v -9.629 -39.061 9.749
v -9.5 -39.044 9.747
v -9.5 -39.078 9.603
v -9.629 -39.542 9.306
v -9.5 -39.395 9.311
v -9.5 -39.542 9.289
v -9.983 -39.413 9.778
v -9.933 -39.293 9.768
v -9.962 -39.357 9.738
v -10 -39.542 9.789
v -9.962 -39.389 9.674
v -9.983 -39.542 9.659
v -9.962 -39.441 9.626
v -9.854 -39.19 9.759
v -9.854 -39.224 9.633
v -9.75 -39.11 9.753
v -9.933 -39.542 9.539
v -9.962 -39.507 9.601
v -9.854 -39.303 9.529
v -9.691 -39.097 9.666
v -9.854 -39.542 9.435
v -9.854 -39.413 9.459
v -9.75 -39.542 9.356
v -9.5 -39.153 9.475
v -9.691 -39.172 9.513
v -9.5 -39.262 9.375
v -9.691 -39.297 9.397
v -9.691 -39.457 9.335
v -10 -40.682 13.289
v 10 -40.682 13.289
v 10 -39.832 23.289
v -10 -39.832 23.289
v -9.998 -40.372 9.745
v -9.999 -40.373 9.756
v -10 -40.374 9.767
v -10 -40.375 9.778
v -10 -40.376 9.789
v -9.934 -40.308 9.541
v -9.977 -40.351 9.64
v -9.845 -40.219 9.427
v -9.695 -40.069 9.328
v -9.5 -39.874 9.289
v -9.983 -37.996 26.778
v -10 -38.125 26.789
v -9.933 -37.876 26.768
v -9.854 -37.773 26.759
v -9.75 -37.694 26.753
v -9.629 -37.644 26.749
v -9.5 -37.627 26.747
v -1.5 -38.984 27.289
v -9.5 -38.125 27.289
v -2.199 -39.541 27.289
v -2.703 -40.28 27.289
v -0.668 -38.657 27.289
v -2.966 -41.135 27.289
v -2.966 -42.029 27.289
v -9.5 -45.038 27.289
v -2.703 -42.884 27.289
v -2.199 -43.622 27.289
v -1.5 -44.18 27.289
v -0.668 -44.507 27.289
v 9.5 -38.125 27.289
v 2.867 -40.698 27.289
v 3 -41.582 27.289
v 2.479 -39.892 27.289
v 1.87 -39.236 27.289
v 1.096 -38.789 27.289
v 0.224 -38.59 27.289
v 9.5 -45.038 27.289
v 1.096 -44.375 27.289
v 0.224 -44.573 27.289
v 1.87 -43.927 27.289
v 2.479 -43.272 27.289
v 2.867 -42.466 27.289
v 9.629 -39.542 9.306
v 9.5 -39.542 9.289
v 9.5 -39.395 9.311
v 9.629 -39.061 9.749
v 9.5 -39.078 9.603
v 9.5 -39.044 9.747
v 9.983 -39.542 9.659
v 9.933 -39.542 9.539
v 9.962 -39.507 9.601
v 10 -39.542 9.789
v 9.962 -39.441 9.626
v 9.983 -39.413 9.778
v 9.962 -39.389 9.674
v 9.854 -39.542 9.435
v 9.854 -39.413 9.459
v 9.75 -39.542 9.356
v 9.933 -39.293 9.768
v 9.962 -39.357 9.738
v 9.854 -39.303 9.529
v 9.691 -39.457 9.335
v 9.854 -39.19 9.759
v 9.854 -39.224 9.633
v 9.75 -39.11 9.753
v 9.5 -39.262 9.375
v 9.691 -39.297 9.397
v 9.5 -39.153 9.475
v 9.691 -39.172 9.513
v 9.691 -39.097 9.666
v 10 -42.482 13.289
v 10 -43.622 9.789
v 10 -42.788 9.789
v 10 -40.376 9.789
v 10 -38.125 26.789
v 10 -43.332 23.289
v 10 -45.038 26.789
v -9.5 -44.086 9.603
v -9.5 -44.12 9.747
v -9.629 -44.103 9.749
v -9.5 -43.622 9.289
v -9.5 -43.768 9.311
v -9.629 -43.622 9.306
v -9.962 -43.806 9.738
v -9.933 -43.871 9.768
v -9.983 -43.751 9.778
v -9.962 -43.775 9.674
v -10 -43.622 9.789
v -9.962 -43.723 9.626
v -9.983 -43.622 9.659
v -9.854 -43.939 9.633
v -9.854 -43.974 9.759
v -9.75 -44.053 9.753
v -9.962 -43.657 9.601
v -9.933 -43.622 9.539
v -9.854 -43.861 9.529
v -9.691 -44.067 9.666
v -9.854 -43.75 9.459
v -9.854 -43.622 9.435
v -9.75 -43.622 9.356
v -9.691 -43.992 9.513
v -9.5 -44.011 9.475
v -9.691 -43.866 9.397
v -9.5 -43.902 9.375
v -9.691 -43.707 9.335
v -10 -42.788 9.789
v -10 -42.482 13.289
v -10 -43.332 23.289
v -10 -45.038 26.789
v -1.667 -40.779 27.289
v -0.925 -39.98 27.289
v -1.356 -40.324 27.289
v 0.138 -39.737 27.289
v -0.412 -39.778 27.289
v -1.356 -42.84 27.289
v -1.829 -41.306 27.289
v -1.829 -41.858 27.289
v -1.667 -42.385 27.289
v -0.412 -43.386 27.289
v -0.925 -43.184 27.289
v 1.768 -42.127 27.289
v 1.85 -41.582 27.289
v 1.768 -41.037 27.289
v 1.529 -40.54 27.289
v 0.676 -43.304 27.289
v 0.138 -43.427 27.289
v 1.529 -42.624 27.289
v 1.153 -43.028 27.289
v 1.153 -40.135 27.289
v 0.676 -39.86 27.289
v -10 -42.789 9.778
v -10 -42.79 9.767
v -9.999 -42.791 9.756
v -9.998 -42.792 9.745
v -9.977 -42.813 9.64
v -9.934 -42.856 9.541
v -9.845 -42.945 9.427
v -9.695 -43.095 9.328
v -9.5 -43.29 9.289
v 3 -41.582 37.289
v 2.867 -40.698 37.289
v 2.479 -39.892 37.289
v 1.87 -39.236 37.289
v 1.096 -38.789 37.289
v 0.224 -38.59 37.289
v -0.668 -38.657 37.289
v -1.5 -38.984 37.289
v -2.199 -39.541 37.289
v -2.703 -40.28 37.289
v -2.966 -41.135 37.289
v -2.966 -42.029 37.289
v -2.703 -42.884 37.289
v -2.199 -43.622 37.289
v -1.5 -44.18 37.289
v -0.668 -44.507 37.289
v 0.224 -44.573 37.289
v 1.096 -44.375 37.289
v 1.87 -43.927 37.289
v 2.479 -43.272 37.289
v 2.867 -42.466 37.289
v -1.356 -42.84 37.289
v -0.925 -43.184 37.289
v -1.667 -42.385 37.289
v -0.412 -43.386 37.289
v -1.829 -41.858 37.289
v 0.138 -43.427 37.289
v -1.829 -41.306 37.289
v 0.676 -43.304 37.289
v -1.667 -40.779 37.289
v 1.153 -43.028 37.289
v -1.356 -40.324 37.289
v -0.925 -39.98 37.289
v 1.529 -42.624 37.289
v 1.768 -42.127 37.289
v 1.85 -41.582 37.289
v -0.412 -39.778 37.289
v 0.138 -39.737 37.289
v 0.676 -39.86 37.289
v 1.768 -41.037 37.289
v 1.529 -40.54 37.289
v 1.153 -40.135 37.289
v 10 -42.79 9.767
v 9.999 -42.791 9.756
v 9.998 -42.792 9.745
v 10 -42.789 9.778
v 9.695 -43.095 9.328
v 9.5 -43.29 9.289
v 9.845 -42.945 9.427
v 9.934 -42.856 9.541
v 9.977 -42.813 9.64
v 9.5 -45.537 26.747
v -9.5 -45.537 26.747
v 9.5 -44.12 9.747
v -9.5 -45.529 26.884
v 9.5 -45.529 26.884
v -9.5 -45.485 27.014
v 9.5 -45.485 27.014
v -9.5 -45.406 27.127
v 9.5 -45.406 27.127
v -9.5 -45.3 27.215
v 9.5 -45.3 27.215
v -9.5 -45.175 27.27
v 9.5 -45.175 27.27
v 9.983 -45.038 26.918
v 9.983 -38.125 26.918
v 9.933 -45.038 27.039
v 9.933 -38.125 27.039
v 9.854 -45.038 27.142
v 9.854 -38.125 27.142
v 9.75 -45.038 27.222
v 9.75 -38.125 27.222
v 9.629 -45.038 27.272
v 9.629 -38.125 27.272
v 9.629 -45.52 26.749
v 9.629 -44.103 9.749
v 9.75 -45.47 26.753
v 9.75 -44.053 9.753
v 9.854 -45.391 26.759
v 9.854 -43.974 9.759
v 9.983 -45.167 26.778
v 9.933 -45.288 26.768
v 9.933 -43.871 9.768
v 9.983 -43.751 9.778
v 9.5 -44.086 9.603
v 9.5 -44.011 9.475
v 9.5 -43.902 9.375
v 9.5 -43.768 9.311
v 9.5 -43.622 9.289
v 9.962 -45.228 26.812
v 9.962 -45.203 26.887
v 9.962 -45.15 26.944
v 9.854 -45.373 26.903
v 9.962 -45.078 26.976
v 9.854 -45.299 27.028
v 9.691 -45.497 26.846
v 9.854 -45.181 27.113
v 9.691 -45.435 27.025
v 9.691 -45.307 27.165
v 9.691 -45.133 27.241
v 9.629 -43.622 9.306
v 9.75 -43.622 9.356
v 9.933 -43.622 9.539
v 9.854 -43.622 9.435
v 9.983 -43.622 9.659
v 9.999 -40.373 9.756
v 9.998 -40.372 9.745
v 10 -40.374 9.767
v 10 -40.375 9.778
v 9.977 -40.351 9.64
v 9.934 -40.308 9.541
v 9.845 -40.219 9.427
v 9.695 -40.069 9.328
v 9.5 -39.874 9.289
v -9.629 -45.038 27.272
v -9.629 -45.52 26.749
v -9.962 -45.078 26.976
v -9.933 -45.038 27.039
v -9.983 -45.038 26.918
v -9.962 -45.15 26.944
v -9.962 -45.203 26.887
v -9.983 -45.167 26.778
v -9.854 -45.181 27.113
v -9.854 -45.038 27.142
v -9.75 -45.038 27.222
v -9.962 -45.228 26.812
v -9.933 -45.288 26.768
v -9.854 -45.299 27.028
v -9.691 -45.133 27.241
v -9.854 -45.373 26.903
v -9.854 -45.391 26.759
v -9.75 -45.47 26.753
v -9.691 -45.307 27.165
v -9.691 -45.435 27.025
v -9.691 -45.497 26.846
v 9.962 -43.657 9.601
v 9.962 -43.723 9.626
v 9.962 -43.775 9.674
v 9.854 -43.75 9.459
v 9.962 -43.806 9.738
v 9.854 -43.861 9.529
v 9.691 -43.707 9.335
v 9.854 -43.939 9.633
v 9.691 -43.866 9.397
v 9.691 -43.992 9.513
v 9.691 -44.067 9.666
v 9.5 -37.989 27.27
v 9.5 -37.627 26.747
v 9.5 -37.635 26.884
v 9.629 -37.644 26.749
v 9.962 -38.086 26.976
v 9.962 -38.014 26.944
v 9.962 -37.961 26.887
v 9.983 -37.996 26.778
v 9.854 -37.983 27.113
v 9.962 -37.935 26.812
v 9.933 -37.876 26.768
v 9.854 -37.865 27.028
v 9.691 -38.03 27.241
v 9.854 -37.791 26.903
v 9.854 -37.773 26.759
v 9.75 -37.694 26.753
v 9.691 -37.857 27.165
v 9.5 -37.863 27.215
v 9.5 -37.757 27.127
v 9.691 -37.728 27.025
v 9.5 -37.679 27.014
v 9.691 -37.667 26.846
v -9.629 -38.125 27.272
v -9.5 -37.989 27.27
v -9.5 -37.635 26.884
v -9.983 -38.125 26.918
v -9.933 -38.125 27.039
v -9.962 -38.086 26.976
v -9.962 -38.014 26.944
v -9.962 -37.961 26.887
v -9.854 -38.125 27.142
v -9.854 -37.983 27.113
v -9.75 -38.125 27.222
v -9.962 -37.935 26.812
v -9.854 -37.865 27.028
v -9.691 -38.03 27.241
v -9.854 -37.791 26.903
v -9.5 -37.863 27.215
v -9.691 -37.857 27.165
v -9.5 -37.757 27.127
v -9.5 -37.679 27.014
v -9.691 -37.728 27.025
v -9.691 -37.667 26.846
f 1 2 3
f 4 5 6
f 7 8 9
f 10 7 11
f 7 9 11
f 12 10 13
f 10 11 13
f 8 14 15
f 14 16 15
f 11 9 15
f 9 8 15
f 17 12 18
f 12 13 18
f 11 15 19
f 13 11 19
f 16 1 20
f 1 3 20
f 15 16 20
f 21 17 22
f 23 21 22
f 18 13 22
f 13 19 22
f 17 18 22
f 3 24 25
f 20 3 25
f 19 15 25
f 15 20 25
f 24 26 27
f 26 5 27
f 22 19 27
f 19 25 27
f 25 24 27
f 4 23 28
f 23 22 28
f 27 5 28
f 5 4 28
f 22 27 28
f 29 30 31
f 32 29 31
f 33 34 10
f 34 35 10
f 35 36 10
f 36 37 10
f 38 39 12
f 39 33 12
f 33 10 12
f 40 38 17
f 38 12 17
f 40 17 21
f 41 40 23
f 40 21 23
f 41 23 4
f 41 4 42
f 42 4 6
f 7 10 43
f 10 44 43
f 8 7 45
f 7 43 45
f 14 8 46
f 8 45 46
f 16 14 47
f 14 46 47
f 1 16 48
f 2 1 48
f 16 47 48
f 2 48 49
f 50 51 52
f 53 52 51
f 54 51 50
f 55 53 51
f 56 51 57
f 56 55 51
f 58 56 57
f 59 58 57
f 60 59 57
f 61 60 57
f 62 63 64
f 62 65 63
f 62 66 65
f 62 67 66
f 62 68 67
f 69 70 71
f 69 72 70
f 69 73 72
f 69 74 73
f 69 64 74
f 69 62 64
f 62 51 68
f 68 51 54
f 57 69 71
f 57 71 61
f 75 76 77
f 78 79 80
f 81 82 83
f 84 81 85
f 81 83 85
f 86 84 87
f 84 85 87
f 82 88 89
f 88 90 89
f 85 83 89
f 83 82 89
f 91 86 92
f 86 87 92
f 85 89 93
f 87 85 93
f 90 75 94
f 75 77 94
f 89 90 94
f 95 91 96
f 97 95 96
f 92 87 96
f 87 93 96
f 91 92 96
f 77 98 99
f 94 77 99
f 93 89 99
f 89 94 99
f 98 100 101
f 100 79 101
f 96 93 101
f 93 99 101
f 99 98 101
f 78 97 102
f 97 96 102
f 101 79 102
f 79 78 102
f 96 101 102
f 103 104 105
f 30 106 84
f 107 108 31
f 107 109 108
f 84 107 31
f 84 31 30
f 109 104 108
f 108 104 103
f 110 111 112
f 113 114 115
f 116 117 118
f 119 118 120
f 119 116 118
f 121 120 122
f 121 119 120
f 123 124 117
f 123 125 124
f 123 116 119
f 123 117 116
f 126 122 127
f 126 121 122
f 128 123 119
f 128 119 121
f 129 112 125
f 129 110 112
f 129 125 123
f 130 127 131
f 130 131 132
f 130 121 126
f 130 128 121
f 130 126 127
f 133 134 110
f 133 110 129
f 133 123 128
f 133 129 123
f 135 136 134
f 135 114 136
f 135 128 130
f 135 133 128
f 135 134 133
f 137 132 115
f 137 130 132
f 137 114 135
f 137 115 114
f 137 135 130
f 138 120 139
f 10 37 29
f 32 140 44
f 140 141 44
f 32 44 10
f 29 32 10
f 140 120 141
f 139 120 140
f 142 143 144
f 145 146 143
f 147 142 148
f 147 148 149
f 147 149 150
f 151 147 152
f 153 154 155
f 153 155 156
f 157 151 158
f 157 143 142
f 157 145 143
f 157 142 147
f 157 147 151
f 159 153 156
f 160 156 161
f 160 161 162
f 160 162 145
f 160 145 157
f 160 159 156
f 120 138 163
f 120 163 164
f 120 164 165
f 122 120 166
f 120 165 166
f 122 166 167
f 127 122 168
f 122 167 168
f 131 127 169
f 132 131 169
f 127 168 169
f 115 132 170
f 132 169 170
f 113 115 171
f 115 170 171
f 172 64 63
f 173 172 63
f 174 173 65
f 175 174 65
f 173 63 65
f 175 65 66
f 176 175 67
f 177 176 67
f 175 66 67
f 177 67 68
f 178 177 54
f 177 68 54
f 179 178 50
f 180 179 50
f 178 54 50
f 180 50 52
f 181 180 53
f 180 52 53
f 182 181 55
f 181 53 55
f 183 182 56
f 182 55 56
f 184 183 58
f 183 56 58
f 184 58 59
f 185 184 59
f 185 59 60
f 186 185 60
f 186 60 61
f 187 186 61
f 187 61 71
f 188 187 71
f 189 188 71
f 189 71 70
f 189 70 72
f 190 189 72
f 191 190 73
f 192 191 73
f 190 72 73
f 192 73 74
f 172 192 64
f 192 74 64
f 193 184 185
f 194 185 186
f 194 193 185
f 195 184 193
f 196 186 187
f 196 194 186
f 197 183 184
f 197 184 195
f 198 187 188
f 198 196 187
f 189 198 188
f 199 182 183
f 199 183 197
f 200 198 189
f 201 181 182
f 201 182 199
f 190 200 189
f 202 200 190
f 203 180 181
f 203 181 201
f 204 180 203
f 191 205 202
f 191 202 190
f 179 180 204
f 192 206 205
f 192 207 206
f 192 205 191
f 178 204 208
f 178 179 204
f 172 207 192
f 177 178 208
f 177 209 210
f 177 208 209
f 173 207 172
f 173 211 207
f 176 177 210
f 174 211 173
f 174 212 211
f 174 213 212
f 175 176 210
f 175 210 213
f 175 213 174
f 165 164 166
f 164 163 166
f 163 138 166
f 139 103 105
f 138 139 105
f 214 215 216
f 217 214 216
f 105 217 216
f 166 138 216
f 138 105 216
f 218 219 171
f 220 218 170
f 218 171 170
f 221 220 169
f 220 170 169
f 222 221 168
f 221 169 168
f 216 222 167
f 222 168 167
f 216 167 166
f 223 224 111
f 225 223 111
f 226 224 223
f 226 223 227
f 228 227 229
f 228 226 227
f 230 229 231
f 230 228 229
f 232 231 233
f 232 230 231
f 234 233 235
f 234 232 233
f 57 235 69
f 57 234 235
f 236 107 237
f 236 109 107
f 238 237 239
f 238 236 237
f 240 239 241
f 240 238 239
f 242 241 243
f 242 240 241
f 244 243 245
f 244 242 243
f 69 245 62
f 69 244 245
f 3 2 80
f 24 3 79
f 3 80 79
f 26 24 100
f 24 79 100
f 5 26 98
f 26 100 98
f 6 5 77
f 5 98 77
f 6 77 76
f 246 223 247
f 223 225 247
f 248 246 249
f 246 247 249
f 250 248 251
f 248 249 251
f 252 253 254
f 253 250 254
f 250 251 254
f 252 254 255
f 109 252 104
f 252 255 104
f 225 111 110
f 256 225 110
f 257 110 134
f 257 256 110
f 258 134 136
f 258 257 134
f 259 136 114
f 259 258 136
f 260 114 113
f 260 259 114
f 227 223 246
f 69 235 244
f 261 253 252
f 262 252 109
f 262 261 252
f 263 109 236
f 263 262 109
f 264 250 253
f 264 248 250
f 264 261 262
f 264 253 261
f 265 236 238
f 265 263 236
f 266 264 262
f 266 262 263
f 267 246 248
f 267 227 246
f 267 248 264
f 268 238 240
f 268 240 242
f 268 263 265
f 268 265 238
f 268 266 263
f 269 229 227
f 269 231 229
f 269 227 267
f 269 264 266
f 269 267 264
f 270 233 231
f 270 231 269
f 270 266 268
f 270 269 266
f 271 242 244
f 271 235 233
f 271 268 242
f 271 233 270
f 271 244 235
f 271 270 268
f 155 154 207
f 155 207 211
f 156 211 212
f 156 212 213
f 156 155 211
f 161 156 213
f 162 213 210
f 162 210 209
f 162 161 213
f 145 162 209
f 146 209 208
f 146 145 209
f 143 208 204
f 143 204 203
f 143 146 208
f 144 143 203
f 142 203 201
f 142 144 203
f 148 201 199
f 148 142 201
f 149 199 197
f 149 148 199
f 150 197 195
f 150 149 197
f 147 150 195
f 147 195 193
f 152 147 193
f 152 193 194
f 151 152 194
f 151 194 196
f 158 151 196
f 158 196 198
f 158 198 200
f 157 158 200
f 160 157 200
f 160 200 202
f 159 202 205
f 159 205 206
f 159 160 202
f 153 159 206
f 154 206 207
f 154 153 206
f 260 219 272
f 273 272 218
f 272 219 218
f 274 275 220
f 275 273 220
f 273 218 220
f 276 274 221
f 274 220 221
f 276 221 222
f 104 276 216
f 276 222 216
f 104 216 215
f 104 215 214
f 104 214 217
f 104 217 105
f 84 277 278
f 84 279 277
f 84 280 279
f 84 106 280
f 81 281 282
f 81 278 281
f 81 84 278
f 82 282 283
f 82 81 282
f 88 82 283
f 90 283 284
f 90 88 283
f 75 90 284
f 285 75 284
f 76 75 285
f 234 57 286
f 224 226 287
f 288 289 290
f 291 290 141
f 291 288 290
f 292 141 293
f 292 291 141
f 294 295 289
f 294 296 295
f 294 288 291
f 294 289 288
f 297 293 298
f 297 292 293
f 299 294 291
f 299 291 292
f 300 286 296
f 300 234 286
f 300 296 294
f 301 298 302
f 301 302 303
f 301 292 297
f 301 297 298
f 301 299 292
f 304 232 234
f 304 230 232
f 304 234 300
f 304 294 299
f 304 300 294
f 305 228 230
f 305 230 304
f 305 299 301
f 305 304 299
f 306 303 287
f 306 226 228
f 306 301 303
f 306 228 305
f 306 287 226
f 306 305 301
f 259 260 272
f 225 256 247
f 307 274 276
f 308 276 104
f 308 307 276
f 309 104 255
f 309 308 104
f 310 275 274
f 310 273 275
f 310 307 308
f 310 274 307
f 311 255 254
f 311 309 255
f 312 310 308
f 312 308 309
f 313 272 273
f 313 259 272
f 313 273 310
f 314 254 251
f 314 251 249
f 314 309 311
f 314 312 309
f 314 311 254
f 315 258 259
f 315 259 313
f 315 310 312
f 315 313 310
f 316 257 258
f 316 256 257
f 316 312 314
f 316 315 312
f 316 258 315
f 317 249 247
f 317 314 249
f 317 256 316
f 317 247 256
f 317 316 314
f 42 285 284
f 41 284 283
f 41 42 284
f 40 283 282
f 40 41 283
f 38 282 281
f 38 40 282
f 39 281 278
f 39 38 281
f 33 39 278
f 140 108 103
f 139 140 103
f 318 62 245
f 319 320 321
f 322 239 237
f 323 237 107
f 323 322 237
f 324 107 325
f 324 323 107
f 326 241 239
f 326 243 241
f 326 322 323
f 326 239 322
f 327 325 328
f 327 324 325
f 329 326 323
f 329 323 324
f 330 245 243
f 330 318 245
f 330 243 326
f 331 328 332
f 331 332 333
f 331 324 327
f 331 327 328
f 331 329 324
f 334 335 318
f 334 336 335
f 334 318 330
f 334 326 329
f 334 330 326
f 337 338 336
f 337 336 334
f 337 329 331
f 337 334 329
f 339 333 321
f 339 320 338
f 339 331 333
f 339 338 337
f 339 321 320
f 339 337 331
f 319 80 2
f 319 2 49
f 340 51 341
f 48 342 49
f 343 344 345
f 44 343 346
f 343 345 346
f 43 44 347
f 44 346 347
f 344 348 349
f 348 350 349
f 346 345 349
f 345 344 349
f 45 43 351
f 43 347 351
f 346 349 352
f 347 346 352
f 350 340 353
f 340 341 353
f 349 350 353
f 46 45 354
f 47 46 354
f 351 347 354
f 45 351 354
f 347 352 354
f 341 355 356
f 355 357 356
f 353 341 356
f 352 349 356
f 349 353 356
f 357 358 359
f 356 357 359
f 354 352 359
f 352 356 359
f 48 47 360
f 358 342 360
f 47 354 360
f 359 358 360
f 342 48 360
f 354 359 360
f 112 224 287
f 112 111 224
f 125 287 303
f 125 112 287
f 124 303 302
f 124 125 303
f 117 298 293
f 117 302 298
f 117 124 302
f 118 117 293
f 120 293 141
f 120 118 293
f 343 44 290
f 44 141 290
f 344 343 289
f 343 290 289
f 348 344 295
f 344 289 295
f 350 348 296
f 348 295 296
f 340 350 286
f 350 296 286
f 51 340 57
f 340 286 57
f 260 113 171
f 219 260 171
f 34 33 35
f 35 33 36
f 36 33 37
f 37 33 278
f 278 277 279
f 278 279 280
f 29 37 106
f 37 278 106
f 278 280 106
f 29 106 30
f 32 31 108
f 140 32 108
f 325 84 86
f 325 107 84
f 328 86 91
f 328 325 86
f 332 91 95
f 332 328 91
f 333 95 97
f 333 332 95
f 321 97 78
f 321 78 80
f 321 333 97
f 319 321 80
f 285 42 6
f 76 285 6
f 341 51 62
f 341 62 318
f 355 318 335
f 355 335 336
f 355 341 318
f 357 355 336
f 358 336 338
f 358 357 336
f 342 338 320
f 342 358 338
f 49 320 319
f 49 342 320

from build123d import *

# Parameters (mm, degrees)
F1_DEPTH = 10
F3_DEPTH = 25
F4_R     = 0.5
F5_R     = 3
F5_R_2   = 1.85
F6_DEPTH = 10


with BuildPart() as f1:
    # F0 (on Right) → F1 (new body, symmetric)
    with BuildSketch(Plane.YZ):
        Polygon((-45.5818854975, 27.2887923438), (-44.0818854975, 9.2887923438), (-39.0818854975, 9.2887923438), (-37.5818854975, 27.2887923438), align=None)
    extrude(amount=F1_DEPTH, both=True)

    # F2 (on face) → F3 (cut)
    with BuildSketch(Plane.YZ.offset(10)):
        Polygon((-42.8318854975, 9.2887923438), (-40.3318854975, 9.2887923438), (-40.6818854975, 13.2887923438), (-39.8318854975, 23.2887923438), (-41.5818854975, 23.2887923438), (-43.3318854975, 23.2887923438), (-42.4818854975, 13.2887923438), align=None)
    extrude(amount=-F3_DEPTH, mode=Mode.SUBTRACT)

    # F4
    f4_edges = [f1.edges().sort_by_distance(p)[0] for p in [
        (10, -44.831885, 18.288792),
        (10, -41.581885, 27.288792),
        (10, -38.331885, 18.288792),
        (0, -39.081885, 9.288792),
        (0, -44.081885, 9.288792),
        (-10, -44.831885, 18.288792),
        (-10, -38.331885, 18.288792),
        (0, -37.581885, 27.288792),
        (0, -45.581885, 27.288792),
        (-10, -41.581885, 27.288792),
        (-10, -39.706885, 9.288792),
        (0, -40.331885, 9.288792),
        (-10, -43.456885, 9.288792),
        (0, -42.831885, 9.288792),
        (10, -39.706885, 9.288792),
        (10, -43.456885, 9.288792),
    ]]
    fillet(f4_edges, radius=F4_R)

    # F5 (on face) → F6 (join)
    with BuildSketch(Plane.XY.offset(27.2887923438)):
        with Locations((0, -41.5818854975)):
            Circle(F5_R)
        with Locations((0, -41.5818854975)):
            Circle(F5_R_2, mode=Mode.SUBTRACT)
    extrude(amount=F6_DEPTH)


solid = f1.part
